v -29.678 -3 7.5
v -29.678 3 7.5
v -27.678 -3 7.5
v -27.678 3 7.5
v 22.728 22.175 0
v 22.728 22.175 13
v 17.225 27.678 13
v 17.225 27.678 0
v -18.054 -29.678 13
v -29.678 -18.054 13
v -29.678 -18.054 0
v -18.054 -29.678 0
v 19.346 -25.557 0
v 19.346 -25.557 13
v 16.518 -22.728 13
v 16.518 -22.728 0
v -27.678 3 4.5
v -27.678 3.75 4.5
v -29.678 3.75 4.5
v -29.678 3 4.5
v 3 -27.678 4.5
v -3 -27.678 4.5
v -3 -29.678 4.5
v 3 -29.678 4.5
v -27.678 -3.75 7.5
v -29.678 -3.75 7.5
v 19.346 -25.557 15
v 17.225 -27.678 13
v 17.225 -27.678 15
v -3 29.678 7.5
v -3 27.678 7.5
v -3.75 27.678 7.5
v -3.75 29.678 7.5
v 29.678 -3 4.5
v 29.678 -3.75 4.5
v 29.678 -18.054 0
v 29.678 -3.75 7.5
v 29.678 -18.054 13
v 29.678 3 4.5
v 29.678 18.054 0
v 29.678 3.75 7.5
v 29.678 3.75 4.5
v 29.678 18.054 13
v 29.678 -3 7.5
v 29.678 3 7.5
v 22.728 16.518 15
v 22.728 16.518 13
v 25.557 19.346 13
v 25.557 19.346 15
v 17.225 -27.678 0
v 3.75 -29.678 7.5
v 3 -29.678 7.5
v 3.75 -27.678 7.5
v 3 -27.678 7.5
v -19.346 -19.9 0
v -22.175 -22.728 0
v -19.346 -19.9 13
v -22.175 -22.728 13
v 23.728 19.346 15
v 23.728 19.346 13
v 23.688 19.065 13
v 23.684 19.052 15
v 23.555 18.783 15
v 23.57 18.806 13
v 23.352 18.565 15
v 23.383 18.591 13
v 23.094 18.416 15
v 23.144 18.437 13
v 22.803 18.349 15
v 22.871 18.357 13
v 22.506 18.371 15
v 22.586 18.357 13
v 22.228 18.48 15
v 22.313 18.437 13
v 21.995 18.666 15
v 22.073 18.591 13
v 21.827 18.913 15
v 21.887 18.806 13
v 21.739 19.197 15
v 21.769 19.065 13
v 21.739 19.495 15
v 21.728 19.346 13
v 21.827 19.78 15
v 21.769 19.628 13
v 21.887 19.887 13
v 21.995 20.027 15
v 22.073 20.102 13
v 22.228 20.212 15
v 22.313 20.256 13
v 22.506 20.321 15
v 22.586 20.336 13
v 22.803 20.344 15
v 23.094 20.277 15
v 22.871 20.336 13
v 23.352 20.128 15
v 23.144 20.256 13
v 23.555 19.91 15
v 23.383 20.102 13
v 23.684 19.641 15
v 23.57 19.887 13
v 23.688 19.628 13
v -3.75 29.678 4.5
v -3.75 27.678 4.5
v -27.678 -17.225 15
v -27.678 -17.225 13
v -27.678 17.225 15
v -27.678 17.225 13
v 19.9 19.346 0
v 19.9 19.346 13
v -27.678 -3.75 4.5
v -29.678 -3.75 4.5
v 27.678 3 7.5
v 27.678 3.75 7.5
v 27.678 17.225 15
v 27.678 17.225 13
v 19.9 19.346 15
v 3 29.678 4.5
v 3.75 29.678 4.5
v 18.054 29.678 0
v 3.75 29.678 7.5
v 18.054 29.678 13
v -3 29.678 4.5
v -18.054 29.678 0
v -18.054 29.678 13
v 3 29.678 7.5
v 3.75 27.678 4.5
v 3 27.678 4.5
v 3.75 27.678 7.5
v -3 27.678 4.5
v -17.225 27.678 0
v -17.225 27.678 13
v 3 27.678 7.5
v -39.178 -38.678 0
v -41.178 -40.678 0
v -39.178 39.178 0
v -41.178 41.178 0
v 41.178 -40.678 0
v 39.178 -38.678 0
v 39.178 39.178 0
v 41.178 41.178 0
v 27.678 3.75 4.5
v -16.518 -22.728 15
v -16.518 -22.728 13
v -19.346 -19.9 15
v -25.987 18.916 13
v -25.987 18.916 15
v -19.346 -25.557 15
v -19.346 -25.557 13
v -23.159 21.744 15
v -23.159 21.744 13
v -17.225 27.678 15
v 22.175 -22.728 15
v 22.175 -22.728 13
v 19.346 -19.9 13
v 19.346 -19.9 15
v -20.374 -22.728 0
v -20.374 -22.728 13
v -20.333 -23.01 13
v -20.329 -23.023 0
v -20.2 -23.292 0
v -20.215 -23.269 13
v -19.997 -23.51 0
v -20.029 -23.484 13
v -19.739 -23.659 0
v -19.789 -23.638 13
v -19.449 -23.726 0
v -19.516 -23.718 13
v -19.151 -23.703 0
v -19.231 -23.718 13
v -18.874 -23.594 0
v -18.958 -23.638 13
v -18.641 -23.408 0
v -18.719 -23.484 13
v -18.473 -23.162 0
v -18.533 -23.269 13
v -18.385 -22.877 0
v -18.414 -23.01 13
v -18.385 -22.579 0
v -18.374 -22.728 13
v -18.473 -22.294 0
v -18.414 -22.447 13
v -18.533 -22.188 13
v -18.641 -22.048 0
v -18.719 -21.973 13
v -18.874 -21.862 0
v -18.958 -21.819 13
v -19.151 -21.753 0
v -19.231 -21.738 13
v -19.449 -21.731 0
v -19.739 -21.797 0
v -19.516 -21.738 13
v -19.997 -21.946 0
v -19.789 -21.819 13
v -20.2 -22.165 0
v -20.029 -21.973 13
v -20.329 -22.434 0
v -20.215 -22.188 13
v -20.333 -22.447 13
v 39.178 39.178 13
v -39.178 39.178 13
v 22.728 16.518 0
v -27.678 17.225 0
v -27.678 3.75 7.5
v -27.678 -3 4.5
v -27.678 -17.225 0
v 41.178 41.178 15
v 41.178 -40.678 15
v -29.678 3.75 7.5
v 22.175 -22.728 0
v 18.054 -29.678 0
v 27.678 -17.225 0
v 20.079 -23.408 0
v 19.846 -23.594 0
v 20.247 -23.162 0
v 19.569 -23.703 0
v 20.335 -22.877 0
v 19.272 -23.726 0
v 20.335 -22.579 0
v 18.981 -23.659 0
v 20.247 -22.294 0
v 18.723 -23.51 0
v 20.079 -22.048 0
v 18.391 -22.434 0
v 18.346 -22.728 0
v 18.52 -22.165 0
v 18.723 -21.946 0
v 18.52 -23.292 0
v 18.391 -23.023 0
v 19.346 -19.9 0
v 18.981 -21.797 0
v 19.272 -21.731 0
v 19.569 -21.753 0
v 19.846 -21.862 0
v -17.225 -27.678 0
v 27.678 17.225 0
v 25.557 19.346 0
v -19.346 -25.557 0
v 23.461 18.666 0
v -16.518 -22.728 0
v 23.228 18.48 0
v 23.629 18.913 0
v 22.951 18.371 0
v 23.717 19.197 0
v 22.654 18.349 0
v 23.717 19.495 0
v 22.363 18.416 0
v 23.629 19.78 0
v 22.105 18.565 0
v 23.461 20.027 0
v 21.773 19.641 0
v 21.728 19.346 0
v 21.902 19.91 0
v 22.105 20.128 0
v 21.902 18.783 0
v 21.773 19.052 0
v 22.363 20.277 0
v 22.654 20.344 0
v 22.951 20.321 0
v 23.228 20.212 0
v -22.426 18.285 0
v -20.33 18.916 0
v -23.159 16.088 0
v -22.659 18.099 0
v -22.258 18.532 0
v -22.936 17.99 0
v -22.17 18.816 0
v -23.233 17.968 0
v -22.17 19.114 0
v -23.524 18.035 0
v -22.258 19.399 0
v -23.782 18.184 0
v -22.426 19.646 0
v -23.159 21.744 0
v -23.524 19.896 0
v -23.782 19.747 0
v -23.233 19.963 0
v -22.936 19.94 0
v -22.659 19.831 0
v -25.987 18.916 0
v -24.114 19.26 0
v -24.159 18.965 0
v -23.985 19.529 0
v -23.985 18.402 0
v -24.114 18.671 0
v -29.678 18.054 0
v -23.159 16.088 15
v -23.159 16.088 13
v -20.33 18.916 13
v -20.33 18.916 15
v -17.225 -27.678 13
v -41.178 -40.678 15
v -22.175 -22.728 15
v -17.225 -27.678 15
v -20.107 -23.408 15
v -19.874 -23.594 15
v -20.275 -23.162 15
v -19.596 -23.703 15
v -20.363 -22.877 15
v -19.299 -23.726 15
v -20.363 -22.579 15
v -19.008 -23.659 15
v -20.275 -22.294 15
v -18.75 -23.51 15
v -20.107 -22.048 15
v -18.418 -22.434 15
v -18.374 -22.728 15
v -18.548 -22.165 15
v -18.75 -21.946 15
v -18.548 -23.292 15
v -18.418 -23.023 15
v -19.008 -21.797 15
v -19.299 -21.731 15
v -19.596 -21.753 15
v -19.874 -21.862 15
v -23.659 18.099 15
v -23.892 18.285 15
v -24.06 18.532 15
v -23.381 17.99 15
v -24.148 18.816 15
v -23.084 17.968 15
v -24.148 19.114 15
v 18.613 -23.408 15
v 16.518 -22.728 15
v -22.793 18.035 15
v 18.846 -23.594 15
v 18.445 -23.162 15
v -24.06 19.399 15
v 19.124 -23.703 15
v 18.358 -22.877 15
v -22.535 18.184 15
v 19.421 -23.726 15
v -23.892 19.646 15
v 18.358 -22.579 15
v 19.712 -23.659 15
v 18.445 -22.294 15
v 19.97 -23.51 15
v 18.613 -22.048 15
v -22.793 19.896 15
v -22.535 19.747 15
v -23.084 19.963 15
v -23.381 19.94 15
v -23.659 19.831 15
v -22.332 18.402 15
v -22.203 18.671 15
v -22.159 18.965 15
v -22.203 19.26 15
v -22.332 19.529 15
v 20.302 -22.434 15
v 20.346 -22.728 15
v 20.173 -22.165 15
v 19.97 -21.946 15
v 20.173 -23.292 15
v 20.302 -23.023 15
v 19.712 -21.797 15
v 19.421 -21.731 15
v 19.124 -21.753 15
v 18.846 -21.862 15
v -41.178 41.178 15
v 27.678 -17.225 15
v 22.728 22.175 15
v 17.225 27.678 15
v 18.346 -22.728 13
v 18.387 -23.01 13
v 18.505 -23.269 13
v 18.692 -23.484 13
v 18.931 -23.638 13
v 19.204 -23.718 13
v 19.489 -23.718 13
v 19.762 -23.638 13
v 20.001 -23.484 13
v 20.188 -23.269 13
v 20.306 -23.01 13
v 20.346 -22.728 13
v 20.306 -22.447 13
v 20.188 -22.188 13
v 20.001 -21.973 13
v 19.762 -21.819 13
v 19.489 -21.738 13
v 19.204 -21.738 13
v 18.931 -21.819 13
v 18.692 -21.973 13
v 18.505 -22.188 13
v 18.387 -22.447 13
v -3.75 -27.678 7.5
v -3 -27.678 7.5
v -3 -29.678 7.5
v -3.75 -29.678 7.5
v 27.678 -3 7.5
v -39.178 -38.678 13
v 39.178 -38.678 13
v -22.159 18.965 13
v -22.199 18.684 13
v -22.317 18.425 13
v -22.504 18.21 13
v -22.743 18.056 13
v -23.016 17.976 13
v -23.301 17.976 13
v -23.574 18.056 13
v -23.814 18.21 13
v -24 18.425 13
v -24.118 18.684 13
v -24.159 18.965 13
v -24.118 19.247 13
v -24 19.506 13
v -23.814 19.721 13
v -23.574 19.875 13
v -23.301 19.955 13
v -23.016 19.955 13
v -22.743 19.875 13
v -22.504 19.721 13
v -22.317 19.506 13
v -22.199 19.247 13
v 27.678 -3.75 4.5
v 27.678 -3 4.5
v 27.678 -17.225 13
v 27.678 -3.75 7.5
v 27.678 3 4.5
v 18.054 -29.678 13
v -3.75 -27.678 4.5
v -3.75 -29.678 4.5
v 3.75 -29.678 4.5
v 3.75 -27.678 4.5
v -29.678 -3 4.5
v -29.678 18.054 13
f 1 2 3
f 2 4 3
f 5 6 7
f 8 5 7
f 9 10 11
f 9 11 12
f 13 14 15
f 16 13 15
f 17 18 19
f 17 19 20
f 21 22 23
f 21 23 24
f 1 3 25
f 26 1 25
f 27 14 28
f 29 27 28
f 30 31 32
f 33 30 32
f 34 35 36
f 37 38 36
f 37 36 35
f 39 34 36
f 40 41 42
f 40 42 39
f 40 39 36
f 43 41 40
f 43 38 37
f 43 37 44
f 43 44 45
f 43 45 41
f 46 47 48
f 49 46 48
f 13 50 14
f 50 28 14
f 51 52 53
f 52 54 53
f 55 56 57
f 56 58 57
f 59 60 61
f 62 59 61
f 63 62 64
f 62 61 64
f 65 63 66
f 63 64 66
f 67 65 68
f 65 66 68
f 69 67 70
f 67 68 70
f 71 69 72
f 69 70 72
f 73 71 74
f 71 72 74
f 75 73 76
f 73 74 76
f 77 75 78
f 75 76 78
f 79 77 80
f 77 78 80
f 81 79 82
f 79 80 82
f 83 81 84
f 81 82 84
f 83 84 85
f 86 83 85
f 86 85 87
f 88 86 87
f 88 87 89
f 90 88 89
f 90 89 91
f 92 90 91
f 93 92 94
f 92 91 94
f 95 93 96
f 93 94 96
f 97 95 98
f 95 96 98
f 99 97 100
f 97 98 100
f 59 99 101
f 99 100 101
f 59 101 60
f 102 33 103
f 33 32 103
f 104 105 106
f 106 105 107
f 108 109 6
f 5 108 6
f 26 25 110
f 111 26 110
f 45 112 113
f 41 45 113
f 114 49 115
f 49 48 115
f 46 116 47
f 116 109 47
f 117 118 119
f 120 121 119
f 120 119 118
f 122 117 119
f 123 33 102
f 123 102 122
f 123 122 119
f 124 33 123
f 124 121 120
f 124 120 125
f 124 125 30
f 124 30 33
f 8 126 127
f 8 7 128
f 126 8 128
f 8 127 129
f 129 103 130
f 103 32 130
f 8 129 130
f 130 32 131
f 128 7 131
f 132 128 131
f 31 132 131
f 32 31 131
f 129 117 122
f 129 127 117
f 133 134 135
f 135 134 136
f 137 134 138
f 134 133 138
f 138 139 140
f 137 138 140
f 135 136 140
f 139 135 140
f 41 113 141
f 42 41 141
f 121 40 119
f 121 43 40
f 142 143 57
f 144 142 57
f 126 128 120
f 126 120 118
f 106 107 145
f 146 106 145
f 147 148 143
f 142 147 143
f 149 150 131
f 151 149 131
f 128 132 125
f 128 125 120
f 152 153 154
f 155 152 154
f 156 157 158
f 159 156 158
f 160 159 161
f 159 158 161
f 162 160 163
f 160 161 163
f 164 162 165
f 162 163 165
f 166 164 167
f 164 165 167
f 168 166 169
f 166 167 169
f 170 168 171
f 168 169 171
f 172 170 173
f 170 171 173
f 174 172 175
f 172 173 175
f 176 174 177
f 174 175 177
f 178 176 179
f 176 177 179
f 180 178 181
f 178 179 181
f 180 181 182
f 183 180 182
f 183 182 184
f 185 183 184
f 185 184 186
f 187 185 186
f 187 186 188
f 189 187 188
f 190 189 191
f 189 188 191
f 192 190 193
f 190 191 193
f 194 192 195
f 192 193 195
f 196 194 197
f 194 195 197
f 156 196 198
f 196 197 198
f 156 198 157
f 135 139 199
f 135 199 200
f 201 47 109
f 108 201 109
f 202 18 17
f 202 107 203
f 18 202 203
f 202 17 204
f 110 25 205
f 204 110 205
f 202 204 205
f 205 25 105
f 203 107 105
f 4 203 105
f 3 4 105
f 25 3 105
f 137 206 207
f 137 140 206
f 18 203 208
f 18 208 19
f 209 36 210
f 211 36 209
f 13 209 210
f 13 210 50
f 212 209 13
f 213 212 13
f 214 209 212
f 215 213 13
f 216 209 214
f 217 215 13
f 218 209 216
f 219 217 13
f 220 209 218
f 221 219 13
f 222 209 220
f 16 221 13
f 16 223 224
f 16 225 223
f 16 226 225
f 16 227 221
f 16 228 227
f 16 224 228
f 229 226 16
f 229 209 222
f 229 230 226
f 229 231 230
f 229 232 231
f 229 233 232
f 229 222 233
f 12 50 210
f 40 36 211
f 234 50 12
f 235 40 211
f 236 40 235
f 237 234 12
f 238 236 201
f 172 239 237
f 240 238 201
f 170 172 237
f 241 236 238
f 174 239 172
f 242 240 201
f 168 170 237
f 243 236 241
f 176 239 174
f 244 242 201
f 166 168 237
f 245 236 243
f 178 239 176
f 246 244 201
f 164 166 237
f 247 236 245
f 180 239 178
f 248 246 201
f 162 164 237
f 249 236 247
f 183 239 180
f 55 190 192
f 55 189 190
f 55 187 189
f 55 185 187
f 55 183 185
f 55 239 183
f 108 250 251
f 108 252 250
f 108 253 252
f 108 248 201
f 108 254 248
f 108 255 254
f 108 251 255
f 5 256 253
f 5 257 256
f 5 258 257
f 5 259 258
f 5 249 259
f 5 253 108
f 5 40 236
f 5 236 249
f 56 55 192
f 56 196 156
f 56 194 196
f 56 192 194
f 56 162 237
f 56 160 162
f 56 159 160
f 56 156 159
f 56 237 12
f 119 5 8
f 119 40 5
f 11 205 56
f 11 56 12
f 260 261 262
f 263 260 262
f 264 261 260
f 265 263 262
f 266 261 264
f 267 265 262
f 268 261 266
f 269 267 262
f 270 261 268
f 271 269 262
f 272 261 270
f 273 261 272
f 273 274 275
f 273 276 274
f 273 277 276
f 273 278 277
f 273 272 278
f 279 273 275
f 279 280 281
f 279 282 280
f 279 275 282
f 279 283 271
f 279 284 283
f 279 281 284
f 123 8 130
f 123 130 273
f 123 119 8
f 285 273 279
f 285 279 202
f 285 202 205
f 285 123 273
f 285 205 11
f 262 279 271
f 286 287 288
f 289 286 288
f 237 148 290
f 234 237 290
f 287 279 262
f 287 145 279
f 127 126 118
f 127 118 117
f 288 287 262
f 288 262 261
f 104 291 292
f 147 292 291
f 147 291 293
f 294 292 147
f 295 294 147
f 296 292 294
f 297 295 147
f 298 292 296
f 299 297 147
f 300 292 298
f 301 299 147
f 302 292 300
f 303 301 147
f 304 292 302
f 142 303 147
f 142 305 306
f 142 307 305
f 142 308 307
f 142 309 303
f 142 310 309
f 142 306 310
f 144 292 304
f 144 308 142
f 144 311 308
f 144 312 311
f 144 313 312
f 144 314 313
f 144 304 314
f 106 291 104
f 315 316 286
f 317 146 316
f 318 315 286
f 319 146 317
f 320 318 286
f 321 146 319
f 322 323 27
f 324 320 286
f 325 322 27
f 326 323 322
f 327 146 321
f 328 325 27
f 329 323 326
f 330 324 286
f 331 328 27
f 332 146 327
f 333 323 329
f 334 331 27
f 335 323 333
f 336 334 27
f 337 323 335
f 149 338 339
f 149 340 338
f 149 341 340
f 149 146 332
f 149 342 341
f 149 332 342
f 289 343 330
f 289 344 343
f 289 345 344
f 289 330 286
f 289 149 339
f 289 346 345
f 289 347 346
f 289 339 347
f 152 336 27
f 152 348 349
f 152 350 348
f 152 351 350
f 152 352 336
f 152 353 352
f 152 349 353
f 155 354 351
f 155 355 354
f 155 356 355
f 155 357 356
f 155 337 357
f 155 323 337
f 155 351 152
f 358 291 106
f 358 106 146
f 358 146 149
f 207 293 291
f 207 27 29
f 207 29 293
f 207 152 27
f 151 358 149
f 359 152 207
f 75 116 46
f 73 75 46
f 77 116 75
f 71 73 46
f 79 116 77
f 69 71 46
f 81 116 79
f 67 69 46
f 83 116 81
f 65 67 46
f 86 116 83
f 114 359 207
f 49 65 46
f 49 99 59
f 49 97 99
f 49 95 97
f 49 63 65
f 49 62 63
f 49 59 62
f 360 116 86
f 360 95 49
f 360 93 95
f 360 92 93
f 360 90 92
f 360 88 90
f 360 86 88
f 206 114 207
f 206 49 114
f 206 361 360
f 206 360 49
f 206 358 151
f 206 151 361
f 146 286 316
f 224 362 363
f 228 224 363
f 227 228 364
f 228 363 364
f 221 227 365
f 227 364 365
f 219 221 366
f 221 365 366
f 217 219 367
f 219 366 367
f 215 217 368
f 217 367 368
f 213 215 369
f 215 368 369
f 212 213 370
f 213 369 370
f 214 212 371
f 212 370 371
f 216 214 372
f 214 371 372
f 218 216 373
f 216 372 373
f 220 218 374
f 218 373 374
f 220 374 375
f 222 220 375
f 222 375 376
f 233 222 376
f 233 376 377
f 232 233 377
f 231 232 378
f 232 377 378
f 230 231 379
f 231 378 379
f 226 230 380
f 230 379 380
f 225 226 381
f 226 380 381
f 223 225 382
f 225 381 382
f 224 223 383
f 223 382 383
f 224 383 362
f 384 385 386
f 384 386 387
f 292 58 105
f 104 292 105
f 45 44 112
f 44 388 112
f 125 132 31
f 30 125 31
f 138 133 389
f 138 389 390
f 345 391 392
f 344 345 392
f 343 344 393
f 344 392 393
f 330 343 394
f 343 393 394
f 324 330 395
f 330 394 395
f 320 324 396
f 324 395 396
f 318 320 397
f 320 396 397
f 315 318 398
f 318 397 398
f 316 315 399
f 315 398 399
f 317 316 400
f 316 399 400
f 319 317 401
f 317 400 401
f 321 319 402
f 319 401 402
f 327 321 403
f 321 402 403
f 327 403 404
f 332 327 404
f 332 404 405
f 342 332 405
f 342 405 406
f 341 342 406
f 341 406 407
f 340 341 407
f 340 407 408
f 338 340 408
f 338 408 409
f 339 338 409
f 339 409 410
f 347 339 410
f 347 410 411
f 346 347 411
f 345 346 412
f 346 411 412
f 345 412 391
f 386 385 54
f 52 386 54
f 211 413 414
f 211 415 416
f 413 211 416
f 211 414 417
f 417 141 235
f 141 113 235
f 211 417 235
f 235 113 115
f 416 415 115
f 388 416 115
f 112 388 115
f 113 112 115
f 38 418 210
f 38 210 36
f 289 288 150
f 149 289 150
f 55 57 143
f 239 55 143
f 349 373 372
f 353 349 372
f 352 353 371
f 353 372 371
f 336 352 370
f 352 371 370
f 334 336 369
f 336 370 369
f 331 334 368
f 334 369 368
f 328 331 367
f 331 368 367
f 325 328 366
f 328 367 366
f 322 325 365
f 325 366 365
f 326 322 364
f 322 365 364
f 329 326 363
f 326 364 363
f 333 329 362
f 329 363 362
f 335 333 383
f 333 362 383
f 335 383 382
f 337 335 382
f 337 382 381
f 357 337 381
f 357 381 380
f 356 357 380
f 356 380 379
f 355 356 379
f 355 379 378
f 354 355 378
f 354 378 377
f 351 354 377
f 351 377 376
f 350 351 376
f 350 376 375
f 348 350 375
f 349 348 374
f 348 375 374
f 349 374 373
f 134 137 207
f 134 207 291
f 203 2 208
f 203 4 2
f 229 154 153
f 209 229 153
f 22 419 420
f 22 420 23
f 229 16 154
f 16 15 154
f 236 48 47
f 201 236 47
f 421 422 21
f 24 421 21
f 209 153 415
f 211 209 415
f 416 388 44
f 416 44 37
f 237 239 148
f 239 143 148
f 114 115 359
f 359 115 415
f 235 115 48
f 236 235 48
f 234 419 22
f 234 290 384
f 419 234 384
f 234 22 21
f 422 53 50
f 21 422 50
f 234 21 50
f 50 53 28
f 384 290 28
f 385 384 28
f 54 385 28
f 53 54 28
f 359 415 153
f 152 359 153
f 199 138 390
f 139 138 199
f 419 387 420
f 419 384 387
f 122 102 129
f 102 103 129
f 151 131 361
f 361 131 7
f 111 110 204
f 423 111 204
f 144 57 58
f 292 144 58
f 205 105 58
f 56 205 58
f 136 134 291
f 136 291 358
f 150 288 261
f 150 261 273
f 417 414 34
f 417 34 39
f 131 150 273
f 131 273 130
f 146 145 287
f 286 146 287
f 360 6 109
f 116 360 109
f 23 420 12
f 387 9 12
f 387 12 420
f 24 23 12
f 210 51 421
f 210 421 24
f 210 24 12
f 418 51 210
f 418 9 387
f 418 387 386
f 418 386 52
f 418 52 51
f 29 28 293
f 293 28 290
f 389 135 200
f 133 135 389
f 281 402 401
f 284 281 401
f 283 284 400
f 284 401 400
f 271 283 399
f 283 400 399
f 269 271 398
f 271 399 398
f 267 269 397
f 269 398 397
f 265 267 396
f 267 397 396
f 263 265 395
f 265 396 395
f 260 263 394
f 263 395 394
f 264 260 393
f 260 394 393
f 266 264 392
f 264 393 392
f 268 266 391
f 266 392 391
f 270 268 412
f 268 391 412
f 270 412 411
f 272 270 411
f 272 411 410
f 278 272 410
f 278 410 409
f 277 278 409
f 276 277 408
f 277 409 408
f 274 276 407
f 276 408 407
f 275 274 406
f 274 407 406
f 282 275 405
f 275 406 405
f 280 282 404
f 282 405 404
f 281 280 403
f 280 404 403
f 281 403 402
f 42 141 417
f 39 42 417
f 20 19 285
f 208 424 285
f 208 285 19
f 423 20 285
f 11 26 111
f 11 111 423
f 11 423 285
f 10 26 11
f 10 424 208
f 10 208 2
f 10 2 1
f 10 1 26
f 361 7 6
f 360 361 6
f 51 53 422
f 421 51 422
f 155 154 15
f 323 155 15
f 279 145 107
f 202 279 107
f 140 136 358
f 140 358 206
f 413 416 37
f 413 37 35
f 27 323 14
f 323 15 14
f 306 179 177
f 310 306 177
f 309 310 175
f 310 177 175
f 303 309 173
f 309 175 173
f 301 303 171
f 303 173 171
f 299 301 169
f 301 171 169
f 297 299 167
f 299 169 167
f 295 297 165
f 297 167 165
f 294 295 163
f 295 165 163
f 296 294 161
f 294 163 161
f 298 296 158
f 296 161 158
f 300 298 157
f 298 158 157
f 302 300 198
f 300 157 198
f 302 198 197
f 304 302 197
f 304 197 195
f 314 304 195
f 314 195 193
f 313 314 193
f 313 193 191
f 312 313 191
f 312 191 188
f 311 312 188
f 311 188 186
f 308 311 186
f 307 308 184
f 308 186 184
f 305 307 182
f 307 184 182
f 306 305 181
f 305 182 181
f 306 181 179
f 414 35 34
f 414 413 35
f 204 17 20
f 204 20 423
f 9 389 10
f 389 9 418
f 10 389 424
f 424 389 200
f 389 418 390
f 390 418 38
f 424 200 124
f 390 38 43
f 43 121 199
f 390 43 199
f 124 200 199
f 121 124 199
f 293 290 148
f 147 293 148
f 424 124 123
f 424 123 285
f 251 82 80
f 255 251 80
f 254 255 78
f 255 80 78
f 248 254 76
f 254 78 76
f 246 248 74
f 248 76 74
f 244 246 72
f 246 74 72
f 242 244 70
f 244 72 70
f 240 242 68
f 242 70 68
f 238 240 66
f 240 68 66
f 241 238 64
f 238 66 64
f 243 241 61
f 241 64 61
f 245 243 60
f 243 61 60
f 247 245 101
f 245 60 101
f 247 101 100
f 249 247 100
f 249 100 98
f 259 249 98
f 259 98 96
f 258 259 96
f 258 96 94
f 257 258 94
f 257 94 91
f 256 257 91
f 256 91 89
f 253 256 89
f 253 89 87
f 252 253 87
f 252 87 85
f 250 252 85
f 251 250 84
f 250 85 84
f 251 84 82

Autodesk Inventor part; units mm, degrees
ref_plane "YZ Plane" through (0, 0, 0) normal (1, 0, 0) x (0, 1, 0)
ref_plane "XZ Plane" through (0, 0, 0) normal (0, 1, 0) x (-1, 0, 0)
sketch "Эскиз1" plane through (0, 0, 0) normal (0, 0, 1) x (1, 0, 0)
  circle A0 centre (0, 31.678) radius 1.5 construction
  circle A1 centre (31.678, 0) radius 1.5 construction
  circle A2 centre (-31.678, 0) radius 1.5 construction
  circle A3 centre (0, -31.678) radius 1.5 construction
  line L0 (21.7815, 38.678) -> (-21.7815, 38.678) construction
  line L1 (-21.7815, 38.678) -> (-38.678, 21.7815) construction
  line L2 (-38.678, 21.7815) -> (-38.678, -21.7815) construction
  line L3 (-38.678, -21.7815) -> (-21.7815, -38.678) construction
  line L4 (-21.7815, -38.678) -> (21.7815, -38.678) construction
  line L5 (21.7815, -38.678) -> (38.678, -21.7815) construction
  line L6 (38.678, -21.7815) -> (38.678, 21.7815) construction
  line L7 (38.678, 21.7815) -> (21.7815, 38.678) construction
  line L8 (17.2251, 27.678) -> (22.7283, 22.1749) construction
  line L9 (22.7283, 22.1749) -> (19.8998, 19.3464) construction
  line L10 (19.8998, 19.3464) -> (22.7283, 16.518) construction
  line L11 (22.7283, 16.518) -> (25.5567, 19.3464) construction
  line L12 (25.5567, 19.3464) -> (27.678, 17.2251) construction
  line L13 (27.678, 17.2251) -> (27.678, -17.2251) construction
  line L14 (27.678, -17.2251) -> (22.1749, -22.7283) construction
  line L15 (22.1749, -22.7283) -> (19.3464, -19.8998) construction
  line L16 (19.3464, -19.8998) -> (16.518, -22.7283) construction
  line L17 (16.518, -22.7283) -> (19.3464, -25.5567) construction
  line L18 (19.3464, -25.5567) -> (17.2251, -27.678) construction
  line L19 (17.2251, -27.678) -> (-17.2251, -27.678) construction
  line L20 (-17.2251, -27.678) -> (-19.3464, -25.5567) construction
  line L21 (-19.3464, -25.5567) -> (-16.518, -22.7283) construction
  line L22 (-16.518, -22.7283) -> (-19.3464, -19.8998) construction
  line L23 (-19.3464, -19.8998) -> (-22.1749, -22.7283) construction
  line L24 (-22.1749, -22.7283) -> (-27.678, -17.2251) construction
  line L25 (-27.678, -17.2251) -> (-27.678, 17.2251) construction
  line L26 (-27.678, 17.2251) -> (-25.9871, 18.916) construction
  line L27 (-17.2251, 27.678) -> (17.2251, 27.678) construction
  circle A4 centre (-5, -30.678) radius 1.5 construction
  circle A5 centre (-30.678, 5) radius 1.5 construction
  circle A6 centre (5, 30.678) radius 1.5 construction
  circle A7 centre (30.678, -5) radius 1.5 construction
  line L28 (38.678, 38.678) -> (-38.678, 38.678) construction
  line L29 (-38.678, 38.678) -> (-38.678, -38.178) construction
  line L30 (-38.678, -38.178) -> (38.678, -38.178) construction
  line L31 (38.678, -38.178) -> (38.678, 38.678) construction
  line L32 (-41.178, -40.678) -> (-41.178, 41.178)
  line L33 (-41.178, 41.178) -> (41.178, 41.178)
  line L34 (41.178, 41.178) -> (41.178, -40.678)
  line L35 (41.178, -40.678) -> (-41.178, -40.678)
  line L36 (-39.178, 39.178) -> (-39.178, -38.678)
  line L37 (-39.178, -38.678) -> (39.178, -38.678)
  line L38 (39.178, -38.678) -> (39.178, 39.178)
  line L39 (39.178, 39.178) -> (-39.178, 39.178)
  circle A8 centre (22.7283, 19.3419) radius 1 projected
  circle A9 centre (-19.3738, -22.7283) radius 1 projected
  circle A10 centre (19.3407, -22.734) radius 1 projected
  circle A11 centre (-23.1587, 18.9654) radius 1 projected
  line L40 (-25.9871, 18.916) -> (-23.1587, 16.0876) projected
  line L41 (-23.1587, 16.0876) -> (-20.3302, 18.916) projected
  line L42 (-20.3302, 18.916) -> (-23.1587, 21.7444) projected
  line L43 (-23.1587, 21.7444) -> (-17.2251, 27.678) projected
  point P0 (0, 0)
  dimension "d0" = 2.5
  dimension "d1" = 2
extrude "Выдавливание1" add sketch "Эскиз1" along normal blind 13 contours L32 L33 L34 L35
sketch "Эскиз2" plane through (0, 0, 13) normal (0, 0, 1) x (1, 0, 0)
  line L0 (41.178, -40.678) -> (-41.178, -40.678)
  line L1 (-41.178, -40.678) -> (-41.178, 41.178)
  line L2 (-41.178, 41.178) -> (41.178, 41.178)
  line L3 (41.178, 41.178) -> (41.178, -40.678)
  circle A0 centre (0, 31.678) radius 1.5 construction
  circle A1 centre (31.678, 0) radius 1.5 construction
  circle A2 centre (-31.678, 0) radius 1.5 construction
  circle A3 centre (0, -31.678) radius 1.5 construction
  line L4 (21.7815, 38.678) -> (-21.7815, 38.678) construction
  line L5 (-21.7815, 38.678) -> (-38.678, 21.7815) construction
  line L6 (-38.678, 21.7815) -> (-38.678, -21.7815) construction
  line L7 (-38.678, -21.7815) -> (-21.7815, -38.678) construction
  line L8 (-21.7815, -38.678) -> (21.7815, -38.678) construction
  line L9 (21.7815, -38.678) -> (38.678, -21.7815) construction
  line L10 (38.678, -21.7815) -> (38.678, 21.7815) construction
  line L11 (38.678, 21.7815) -> (21.7815, 38.678) construction
  line L12 (17.2251, 27.678) -> (22.7283, 22.1749) construction
  line L13 (22.7283, 22.1749) -> (19.8998, 19.3464) construction
  line L14 (19.8998, 19.3464) -> (22.7283, 16.518) construction
  line L15 (22.7283, 16.518) -> (25.5567, 19.3464) construction
  line L16 (25.5567, 19.3464) -> (27.678, 17.2251) construction
  line L17 (27.678, 17.2251) -> (27.678, -17.2251) construction
  line L18 (27.678, -17.2251) -> (22.1749, -22.7283) construction
  line L19 (22.1749, -22.7283) -> (19.3464, -19.8998) construction
  line L20 (19.3464, -19.8998) -> (16.518, -22.7283) construction
  line L21 (16.518, -22.7283) -> (19.3464, -25.5567) construction
  line L22 (19.3464, -25.5567) -> (17.2251, -27.678) construction
  line L23 (17.2251, -27.678) -> (-17.2251, -27.678) construction
  line L24 (-17.2251, -27.678) -> (-19.3464, -25.5567) construction
  line L25 (-19.3464, -25.5567) -> (-16.518, -22.7283) construction
  line L26 (-16.518, -22.7283) -> (-19.3464, -19.8998) construction
  line L27 (-19.3464, -19.8998) -> (-22.1749, -22.7283) construction
  line L28 (-22.1749, -22.7283) -> (-27.678, -17.2251) construction
  line L29 (-27.678, -17.2251) -> (-27.678, 17.2251) construction
  line L30 (-27.678, 17.2251) -> (-17.2251, 27.678) construction
  line L31 (-17.2251, 27.678) -> (17.2251, 27.678) construction
  circle A4 centre (-5, -30.678) radius 1.5 construction
  circle A5 centre (-30.678, 5) radius 1.5 construction
  circle A6 centre (5, 30.678) radius 1.5 construction
  circle A7 centre (30.678, -5) radius 1.5 construction
  circle A8 centre (0, 31.678) radius 1.5 construction
  circle A9 centre (31.678, 0) radius 1.5 construction
  circle A10 centre (-31.678, 0) radius 1.5 construction
  circle A11 centre (0, -31.678) radius 1.5 construction
  line L32 (21.7815, 38.678) -> (-21.7815, 38.678) construction
  line L33 (-21.7815, 38.678) -> (-38.678, 21.7815) construction
  line L34 (-38.678, 21.7815) -> (-38.678, -21.7815) construction
  line L35 (-38.678, -21.7815) -> (-21.7815, -38.678) construction
  line L36 (-21.7815, -38.678) -> (21.7815, -38.678) construction
  line L37 (21.7815, -38.678) -> (38.678, -21.7815) construction
  line L38 (38.678, -21.7815) -> (38.678, 21.7815) construction
  line L39 (38.678, 21.7815) -> (21.7815, 38.678) construction
  line L40 (17.2251, 27.678) -> (22.7283, 22.1749)
  line L41 (22.7283, 22.1749) -> (19.8998, 19.3464)
  line L42 (19.8998, 19.3464) -> (22.7283, 16.518)
  line L43 (22.7283, 16.518) -> (25.5567, 19.3464)
  line L44 (25.5567, 19.3464) -> (27.678, 17.2251)
  line L45 (27.678, 17.2251) -> (27.678, -17.2251)
  line L46 (27.678, -17.2251) -> (22.1749, -22.7283)
  line L47 (22.1749, -22.7283) -> (19.3464, -19.8998)
  line L48 (19.3464, -19.8998) -> (16.518, -22.7283)
  line L49 (16.518, -22.7283) -> (19.3464, -25.5567)
  line L50 (19.3464, -25.5567) -> (17.2251, -27.678)
  line L51 (17.2251, -27.678) -> (-17.2251, -27.678)
  line L52 (-17.2251, -27.678) -> (-19.3464, -25.5567)
  line L53 (-19.3464, -25.5567) -> (-16.518, -22.7283)
  line L54 (-16.518, -22.7283) -> (-19.3464, -19.8998)
  line L55 (-19.3464, -19.8998) -> (-22.1749, -22.7283)
  line L56 (-22.1749, -22.7283) -> (-27.678, -17.2251)
  line L57 (-27.678, -17.2251) -> (-27.678, 17.2251)
  line L58 (-27.678, 17.2251) -> (-17.2251, 27.678)
  line L59 (-17.2251, 27.678) -> (17.2251, 27.678)
  circle A12 centre (-5, -30.678) radius 1.5 construction
  circle A13 centre (-30.678, 5) radius 1.5 construction
  circle A14 centre (5, 30.678) radius 1.5 construction
  circle A15 centre (30.678, -5) radius 1.5 construction
  circle A16 centre (19.3464, -22.7283) radius 1
  circle A17 centre (22.7283, 19.3464) radius 1
  line L60 (-25.9871, 18.916) -> (-23.1587, 16.0876)
  line L61 (-23.1587, 16.0876) -> (-20.3302, 18.916)
  line L62 (-20.3302, 18.916) -> (-23.1587, 21.7444)
  circle A18 centre (-23.1587, 18.9654) radius 1
  circle A19 centre (-19.3738, -22.7283) radius 1
  point P0 (0, 0)
extrude "Выдавливание2" add sketch "Эскиз2" along normal blind 2 contours L0 L1 L2 L3 | L62 L61 L60 L58
sketch "Эскиз3" plane through (0, 0, 13) normal (0, 0, -1) x (-1, 0, 0)
  circle A0 centre (0, 31.678) radius 1.5 construction
  circle A1 centre (-31.678, 0) radius 1.5 construction
  circle A2 centre (31.678, 0) radius 1.5 construction
  circle A3 centre (0, -31.678) radius 1.5 construction
  line L0 (-21.7815, 38.678) -> (21.7815, 38.678) construction
  line L1 (-38.678, 21.7815) -> (-21.7815, 38.678) construction
  line L2 (-38.678, -21.7815) -> (-38.678, 21.7815) construction
  line L3 (-21.7815, -38.678) -> (-38.678, -21.7815) construction
  line L4 (21.7815, -38.678) -> (-21.7815, -38.678) construction
  line L5 (38.678, -21.7815) -> (21.7815, -38.678) construction
  line L6 (38.678, 21.7815) -> (38.678, -21.7815) construction
  line L7 (21.7815, 38.678) -> (38.678, 21.7815) construction
  line L8 (-17.2251, 27.678) -> (-22.7283, 22.1749) construction
  line L9 (17.2251, 27.678) -> (-17.2251, 27.678) construction
  line L10 (27.678, 17.2251) -> (25.9871, 18.916) construction
  line L11 (27.678, -17.2251) -> (27.678, 17.2251) construction
  line L12 (22.1749, -22.7283) -> (27.678, -17.2251) construction
  line L13 (19.3464, -25.5567) -> (22.1749, -22.7283) construction
  line L14 (17.2251, -27.678) -> (19.3464, -25.5567) construction
  line L15 (-17.2251, -27.678) -> (17.2251, -27.678) construction
  line L16 (-19.3464, -25.5567) -> (-17.2251, -27.678) construction
  line L17 (-22.1749, -22.7283) -> (-19.3464, -25.5567) construction
  line L18 (-27.678, -17.2251) -> (-22.1749, -22.7283) construction
  line L19 (-27.678, 17.2251) -> (-27.678, -17.2251) construction
  line L20 (-25.5567, 19.3464) -> (-27.678, 17.2251) construction
  line L21 (-22.7283, 22.1749) -> (-25.5567, 19.3464) construction
  circle A4 centre (5, -30.678) radius 1.5 construction
  circle A5 centre (30.678, 5) radius 1.5 construction
  circle A6 centre (-5, 30.678) radius 1.5 construction
  circle A7 centre (-30.678, -5) radius 1.5 construction
  line L22 (18.0535, -29.678) -> (-18.0535, -29.678)
  line L23 (-18.0535, -29.678) -> (-29.678, -18.0535)
  line L24 (-29.678, -18.0535) -> (-29.678, 18.0535)
  line L25 (-29.678, 18.0535) -> (-18.0535, 29.678)
  line L26 (-18.0535, 29.678) -> (18.0535, 29.678)
  line L27 (18.0535, 29.678) -> (29.678, 18.0535)
  line L28 (29.678, 18.0535) -> (29.678, -18.0535)
  line L29 (29.678, -18.0535) -> (18.0535, -29.678)
  line L30 (17.2251, -27.678) -> (-17.2251, -27.678)
  line L31 (-27.678, -17.2251) -> (-27.678, 17.2251)
  line L32 (-17.2251, 27.678) -> (17.2251, 27.678)
  line L33 (27.678, 17.2251) -> (27.678, -17.2251)
  line L34 (16.518, -22.7283) -> (19.3464, -25.5567) projected
  line L35 (19.3464, -19.8998) -> (16.518, -22.7283) projected
  line L36 (22.1749, -22.7283) -> (19.3464, -19.8998) projected
  line L37 (-25.5567, 19.3464) -> (-22.7283, 16.518) projected
  line L38 (-22.7283, 16.518) -> (-19.8998, 19.3464) projected
  line L39 (-19.8998, 19.3464) -> (-22.7283, 22.1749) projected
  circle A8 centre (-22.7283, 19.3464) radius 1 projected
  line L40 (-19.3464, -25.5567) -> (-16.518, -22.7283) projected
  line L41 (-16.518, -22.7283) -> (-19.3464, -19.8998) projected
  line L42 (-19.3464, -19.8998) -> (-22.1749, -22.7283) projected
  circle A9 centre (-19.3464, -22.7283) radius 1 projected
  line L43 (27.678, -17.2251) -> (22.1749, -22.7283)
  line L44 (19.3464, -25.5567) -> (17.2251, -27.678)
  line L45 (-27.678, 17.2251) -> (-25.5567, 19.3464)
  line L46 (-22.7283, 22.1749) -> (-17.2251, 27.678)
  line L47 (-17.2251, -27.678) -> (-19.3464, -25.5567)
  line L48 (-22.1749, -22.7283) -> (-27.678, -17.2251)
  line L49 (23.1587, 21.7444) -> (17.2251, 27.678) projected
  line L50 (25.9871, 18.916) -> (23.1587, 21.7444) projected
  circle A10 centre (19.3738, -22.7283) radius 1 projected
  circle A11 centre (23.1587, 18.9654) radius 1 projected
  line L51 (20.3302, 18.916) -> (23.1587, 21.7444) projected
  line L52 (23.1587, 16.0876) -> (20.3302, 18.916) projected
  line L53 (25.9871, 18.916) -> (23.1587, 16.0876) projected
  line L54 (17.2251, 27.678) -> (23.1587, 21.7444)
  line L55 (25.9871, 18.916) -> (27.678, 17.2251)
  point P0 (0, 0)
  dimension "d9" = 9
ref_plane "РабПлоскость1" through (-38.678, -38.678, 0) normal (0, 0, 1) x (1, 0, 0)
extrude "Выдавливание3" add sketch "Эскиз3" along normal up to surface (13 mm away) contours L22 L23 L24 L25 L26 L27 L28 L29 | L53 L52 L51 L50
sketch "Эскиз4" plane through (-27.678, -17.2251, 15) normal (1, 0, 0) x (0, 0, -1)
  line L0 (10, 20.2251) -> (10, 14.2251) construction
  line L1 (10.5, 20.2251) -> (10.5, 14.2251)
  line L2 (7.5, 20.2251) -> (7.5, 14.2251)
  line L3 (15, 58.4031) -> (15, -23.4529) projected
  line L4 (7.5, 20.2251) -> (7.5, 20.9751)
  line L5 (7.5, 20.9751) -> (10.5, 20.9751)
  line L6 (10.5, 20.9751) -> (10.5, 20.2251)
  line L7 (7.5, 14.2251) -> (7.5, 13.4751)
  line L8 (7.5, 13.4751) -> (10.5, 13.4751)
  line L9 (10.5, 13.4751) -> (10.5, 14.2251)
  point P0 (15, 17.2251)
  dimension "d13" = 0.5
  dimension "d14" = 2.5
  dimension "d18" = 0.75
  dimension "d19" = 0.75
extrude "Выдавливание4" cut sketch "Эскиз4" against normal up to surface (2 mm away)
sketch "Эскиз5" plane through (-17.2251, 27.678, 15) normal (0, -1, 0) x (1, 0, 0)
  line L0 (20.2251, -10) -> (14.2251, -10) construction
  line L1 (20.2251, -10.5) -> (14.2251, -10.5)
  line L2 (20.2251, -7.5) -> (14.2251, -7.5)
  line L3 (20.2251, -7.5) -> (20.9751, -7.5)
  line L4 (20.9751, -7.5) -> (20.9751, -10.5)
  line L5 (20.9751, -10.5) -> (20.2251, -10.5)
  line L6 (14.2251, -7.5) -> (13.4751, -7.5)
  line L7 (13.4751, -7.5) -> (13.4751, -10.5)
  line L8 (13.4751, -10.5) -> (14.2251, -10.5)
  point P0 (17.2251, -15)
  dimension "d20" = 0.5
  dimension "d21" = 2.5
  dimension "d22" = 0.75
  dimension "d23" = 0.75
extrude "Выдавливание5" cut sketch "Эскиз5" against normal up to surface (2 mm away)
sketch "Эскиз6" plane through (27.678, -17.2251, 15) normal (-1, 0, 0) x (0, 0, 1)
  line L0 (-10, 14.2251) -> (-10, 20.2251) construction
  line L1 (-10.5, 14.2251) -> (-10.5, 20.2251)
  line L2 (-7.5, 14.2251) -> (-7.5, 20.2251)
  line L3 (-7.5, 14.2251) -> (-7.5, 13.4751)
  line L4 (-7.5, 13.4751) -> (-10.5, 13.4751)
  line L5 (-10.5, 13.4751) -> (-10.5, 14.2251)
  line L6 (-7.5, 20.2251) -> (-7.5, 20.9751)
  line L7 (-7.5, 20.9751) -> (-10.5, 20.9751)
  line L8 (-10.5, 20.9751) -> (-10.5, 20.2251)
  point P0 (-15, 17.2251)
  dimension "d26" = 0.5
  dimension "d27" = 2.5
  dimension "d28" = 0.75
  dimension "d29" = 0.75
extrude "Выдавливание6" cut sketch "Эскиз6" against normal up to surface (2 mm away)
sketch "Эскиз7" plane through (-17.2251, -27.678, 15) normal (0, 1, 0) x (1, 0, 0)
  line L0 (14.2251, 10) -> (20.2251, 10) construction
  line L1 (14.2251, 10.5) -> (20.2251, 10.5)
  line L2 (14.2251, 7.5) -> (20.2251, 7.5)
  line L3 (20.2251, 7.5) -> (20.9751, 7.5)
  line L4 (56.4031, 15) -> (-21.9529, 15) projected
  line L5 (20.9751, 7.5) -> (20.9751, 10.5)
  line L6 (20.9751, 10.5) -> (20.2251, 10.5)
  line L7 (14.2251, 7.5) -> (13.4751, 7.5)
  line L8 (13.4751, 7.5) -> (13.4751, 10.5)
  line L9 (13.4751, 10.5) -> (14.2251, 10.5)
  point P0 (17.2251, 15)
  dimension "d32" = 0.5
  dimension "d33" = 2.5
  dimension "d34" = 0.75
  dimension "d35" = 0.75
extrude "Выдавливание7" cut sketch "Эскиз7" against normal up to surface (2 mm away)
properties part number "Середина 2"
